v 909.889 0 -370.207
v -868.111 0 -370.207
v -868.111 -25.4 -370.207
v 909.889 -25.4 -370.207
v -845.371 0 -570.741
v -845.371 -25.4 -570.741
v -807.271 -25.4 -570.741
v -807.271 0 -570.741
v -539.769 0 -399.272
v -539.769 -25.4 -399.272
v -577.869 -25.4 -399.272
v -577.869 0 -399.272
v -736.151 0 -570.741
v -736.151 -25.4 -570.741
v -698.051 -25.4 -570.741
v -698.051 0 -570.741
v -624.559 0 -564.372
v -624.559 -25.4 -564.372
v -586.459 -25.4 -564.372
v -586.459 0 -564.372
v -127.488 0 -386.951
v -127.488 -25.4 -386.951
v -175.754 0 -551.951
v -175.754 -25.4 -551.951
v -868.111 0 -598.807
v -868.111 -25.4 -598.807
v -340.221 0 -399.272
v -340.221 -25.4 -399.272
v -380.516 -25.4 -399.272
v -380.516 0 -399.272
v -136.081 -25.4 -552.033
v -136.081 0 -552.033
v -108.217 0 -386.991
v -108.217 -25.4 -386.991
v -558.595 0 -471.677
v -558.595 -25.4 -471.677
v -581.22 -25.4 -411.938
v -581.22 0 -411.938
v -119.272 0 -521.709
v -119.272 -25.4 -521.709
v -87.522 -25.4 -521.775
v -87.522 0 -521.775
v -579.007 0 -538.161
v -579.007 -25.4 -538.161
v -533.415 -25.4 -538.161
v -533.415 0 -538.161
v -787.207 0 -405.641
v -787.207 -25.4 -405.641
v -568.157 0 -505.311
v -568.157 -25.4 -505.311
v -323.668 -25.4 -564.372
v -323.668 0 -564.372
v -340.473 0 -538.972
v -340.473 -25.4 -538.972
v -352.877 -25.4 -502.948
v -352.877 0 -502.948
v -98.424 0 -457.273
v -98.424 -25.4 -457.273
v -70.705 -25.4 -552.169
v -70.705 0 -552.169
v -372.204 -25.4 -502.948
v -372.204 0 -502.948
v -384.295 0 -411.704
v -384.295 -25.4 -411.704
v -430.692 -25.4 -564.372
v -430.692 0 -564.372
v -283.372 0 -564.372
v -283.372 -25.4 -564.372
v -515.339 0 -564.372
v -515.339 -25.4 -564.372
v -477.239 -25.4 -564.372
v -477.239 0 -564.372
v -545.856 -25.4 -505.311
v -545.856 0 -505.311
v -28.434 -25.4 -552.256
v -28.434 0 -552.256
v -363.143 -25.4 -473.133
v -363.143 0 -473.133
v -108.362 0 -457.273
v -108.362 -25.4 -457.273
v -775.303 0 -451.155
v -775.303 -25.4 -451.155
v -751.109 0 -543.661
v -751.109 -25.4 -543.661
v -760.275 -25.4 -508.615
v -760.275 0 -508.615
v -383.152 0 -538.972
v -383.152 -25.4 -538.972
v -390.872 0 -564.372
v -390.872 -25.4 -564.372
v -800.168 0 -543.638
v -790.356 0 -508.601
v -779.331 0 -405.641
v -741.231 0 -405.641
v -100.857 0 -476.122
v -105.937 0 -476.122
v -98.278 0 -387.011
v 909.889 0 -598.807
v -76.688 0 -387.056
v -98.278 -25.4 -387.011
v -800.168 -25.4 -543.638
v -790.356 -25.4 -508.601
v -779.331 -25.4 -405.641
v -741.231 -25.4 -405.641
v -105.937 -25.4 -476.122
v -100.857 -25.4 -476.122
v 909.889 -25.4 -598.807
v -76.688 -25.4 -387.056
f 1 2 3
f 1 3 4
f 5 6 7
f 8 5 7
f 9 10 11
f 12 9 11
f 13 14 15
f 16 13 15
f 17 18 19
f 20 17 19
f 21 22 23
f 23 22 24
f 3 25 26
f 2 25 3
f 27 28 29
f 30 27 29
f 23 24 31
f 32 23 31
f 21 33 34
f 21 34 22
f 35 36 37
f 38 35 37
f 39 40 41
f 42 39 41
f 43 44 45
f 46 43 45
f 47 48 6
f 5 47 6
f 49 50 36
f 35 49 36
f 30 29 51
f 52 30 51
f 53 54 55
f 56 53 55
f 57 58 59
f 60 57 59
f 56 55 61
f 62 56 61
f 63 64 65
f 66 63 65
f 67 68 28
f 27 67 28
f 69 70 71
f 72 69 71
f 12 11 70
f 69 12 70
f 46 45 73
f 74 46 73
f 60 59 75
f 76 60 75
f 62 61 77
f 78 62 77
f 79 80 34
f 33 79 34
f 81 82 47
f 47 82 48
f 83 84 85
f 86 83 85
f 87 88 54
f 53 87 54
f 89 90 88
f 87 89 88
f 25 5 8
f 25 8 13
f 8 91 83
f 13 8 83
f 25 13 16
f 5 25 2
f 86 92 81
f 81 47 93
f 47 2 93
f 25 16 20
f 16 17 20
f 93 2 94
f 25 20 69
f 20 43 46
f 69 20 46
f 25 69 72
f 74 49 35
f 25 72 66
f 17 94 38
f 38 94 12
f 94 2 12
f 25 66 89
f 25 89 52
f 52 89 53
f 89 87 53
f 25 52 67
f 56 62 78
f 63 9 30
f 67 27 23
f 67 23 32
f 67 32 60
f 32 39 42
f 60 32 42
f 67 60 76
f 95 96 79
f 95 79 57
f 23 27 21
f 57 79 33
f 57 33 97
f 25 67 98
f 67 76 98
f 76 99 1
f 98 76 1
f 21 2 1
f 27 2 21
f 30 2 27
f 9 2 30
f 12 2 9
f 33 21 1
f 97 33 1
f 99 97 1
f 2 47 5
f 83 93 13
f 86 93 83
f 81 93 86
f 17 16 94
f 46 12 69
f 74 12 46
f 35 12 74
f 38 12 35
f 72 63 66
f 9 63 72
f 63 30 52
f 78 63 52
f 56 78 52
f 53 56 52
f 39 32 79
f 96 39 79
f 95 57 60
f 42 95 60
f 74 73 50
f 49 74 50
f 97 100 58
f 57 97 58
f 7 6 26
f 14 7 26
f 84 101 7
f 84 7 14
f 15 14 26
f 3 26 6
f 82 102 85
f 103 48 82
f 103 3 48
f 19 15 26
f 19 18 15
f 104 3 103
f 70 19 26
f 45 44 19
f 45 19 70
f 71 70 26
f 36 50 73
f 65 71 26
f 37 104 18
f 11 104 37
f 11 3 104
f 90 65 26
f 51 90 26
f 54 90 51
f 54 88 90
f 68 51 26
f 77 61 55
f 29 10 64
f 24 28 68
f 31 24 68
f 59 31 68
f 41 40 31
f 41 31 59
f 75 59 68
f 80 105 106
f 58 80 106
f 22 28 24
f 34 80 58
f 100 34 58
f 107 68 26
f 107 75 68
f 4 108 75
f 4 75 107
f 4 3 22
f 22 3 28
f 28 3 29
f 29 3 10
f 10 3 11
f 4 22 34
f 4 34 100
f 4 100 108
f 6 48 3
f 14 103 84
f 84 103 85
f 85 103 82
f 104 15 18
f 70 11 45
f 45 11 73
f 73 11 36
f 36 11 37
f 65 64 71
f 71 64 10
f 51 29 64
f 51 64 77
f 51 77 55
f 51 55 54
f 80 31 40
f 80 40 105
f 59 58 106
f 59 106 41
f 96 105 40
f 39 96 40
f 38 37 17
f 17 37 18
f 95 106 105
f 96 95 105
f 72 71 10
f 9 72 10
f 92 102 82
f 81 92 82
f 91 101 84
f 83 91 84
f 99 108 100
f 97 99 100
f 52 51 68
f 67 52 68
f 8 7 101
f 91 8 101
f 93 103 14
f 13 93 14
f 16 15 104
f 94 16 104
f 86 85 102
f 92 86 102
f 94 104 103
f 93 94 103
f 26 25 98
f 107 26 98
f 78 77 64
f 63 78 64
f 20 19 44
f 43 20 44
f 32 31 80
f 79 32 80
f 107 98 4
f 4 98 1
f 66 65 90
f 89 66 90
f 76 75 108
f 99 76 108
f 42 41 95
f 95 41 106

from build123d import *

# Parameters (mm, degrees)
F0_W     = 1778
F0_H     = 228.6
F1_DEPTH = 25.4
F3_DEPTH = 25.4
F5_DEPTH = 25.4
F7_DEPTH = 25.4
F9_DEPTH = 25.4


# Not quite as in the source:
# - a feature names something its author has since deleted; it is built from what else it names


with BuildPart() as f1:
    # F0 (on Front) → F1 (new body)
    with BuildSketch(Plane.XZ):
        with Locations((20.8893120289, -484.507374977)):
            Rectangle(F0_W, F0_H)
    extrude(amount=F1_DEPTH)

    # F2 (on face) → F3 (cut)
    with BuildSketch(Plane.XZ.offset(25.4)):
        Polygon((-787.2068197411, -405.6409977913), (-845.3705171574, -570.7409977913), (-807.2705171574, -570.7409977913), (-800.1682969996, -543.6377111227), (-751.1093717848, -543.6606517417), (-760.2752358596, -508.6147008675), (-790.3561904598, -508.6006346051), (-775.3030676873, -451.1553438794), align=None)
        Polygon((-779.3305171574, -405.6409977913), (-736.1505171574, -570.7409977913), (-698.0505171574, -570.7409977913), (-741.2305171574, -405.6409977913), align=None)
    extrude(amount=-F3_DEPTH, mode=Mode.SUBTRACT)

    # F4 (on face) → F5 (cut)
    with BuildSketch(Plane.XZ.offset(25.4)):
        Polygon((-577.868904515, -399.2722157273), (-515.3390834819, -564.3722157273), (-477.2390834819, -564.3722157273), (-539.768904515, -399.2722157273), align=None)
        Polygon((-581.2202315634, -411.9376221896), (-624.5590834819, -564.3722157273), (-586.4590834819, -564.3722157273), (-579.0069102806, -538.1608847247), (-533.414550058, -538.1608847247), (-545.856203928, -505.3106858916), (-568.1572882119, -505.3106858916), (-558.5947445746, -471.6766049683), align=None)
    extrude(amount=-F5_DEPTH, mode=Mode.SUBTRACT)

    # F6 (on face) → F7 (cut)
    with BuildSketch(Plane.XZ.offset(25.4)):
        Polygon((-384.2945505557, -411.7044204948), (-430.6923954532, -564.3722157273), (-390.8717237614, -564.3722157273), (-383.1523140548, -538.9722157273), (-372.2040461495, -502.9479579969), (-363.142928275, -473.133192003), align=None)
        Polygon((-372.2040461495, -502.9479579969), (-383.1523140548, -538.9722157273), (-340.4727343746, -538.9722157273), (-352.8768810595, -502.9479579969), align=None)
        Polygon((-340.2208844074, -399.2722157273), (-380.5162323606, -399.2722157273), (-323.6677434064, -564.3722157273), (-283.3723954532, -564.3722157273), align=None)
    extrude(amount=-F7_DEPTH, mode=Mode.SUBTRACT)

    # F8 (on face) → F9 (cut)
    with BuildSketch(Plane.XZ.offset(25.4)):
        Polygon((-108.2167720242, -386.9905862627), (-127.4883288311, -386.9506543679), (-175.7540198106, -551.9509992015), (-136.0814640163, -552.0332032675), (-108.3624021802, -457.2732471037), align=None)
        Polygon((-105.9366706351, -476.1219167204), (-119.2716706351, -521.7087415168), (-87.5217387934, -521.7745294006), (-100.8566706351, -476.1219167204), align=None)
        Polygon((-28.4340198106, -552.2562556378), (-76.6883288311, -387.055915208), (-98.2782824835, -387.011179447), (-98.4238699691, -457.2732471037), (-70.7053259606, -552.1686667953), align=None)
    extrude(amount=-F9_DEPTH, mode=Mode.SUBTRACT)


solid = f1.part
